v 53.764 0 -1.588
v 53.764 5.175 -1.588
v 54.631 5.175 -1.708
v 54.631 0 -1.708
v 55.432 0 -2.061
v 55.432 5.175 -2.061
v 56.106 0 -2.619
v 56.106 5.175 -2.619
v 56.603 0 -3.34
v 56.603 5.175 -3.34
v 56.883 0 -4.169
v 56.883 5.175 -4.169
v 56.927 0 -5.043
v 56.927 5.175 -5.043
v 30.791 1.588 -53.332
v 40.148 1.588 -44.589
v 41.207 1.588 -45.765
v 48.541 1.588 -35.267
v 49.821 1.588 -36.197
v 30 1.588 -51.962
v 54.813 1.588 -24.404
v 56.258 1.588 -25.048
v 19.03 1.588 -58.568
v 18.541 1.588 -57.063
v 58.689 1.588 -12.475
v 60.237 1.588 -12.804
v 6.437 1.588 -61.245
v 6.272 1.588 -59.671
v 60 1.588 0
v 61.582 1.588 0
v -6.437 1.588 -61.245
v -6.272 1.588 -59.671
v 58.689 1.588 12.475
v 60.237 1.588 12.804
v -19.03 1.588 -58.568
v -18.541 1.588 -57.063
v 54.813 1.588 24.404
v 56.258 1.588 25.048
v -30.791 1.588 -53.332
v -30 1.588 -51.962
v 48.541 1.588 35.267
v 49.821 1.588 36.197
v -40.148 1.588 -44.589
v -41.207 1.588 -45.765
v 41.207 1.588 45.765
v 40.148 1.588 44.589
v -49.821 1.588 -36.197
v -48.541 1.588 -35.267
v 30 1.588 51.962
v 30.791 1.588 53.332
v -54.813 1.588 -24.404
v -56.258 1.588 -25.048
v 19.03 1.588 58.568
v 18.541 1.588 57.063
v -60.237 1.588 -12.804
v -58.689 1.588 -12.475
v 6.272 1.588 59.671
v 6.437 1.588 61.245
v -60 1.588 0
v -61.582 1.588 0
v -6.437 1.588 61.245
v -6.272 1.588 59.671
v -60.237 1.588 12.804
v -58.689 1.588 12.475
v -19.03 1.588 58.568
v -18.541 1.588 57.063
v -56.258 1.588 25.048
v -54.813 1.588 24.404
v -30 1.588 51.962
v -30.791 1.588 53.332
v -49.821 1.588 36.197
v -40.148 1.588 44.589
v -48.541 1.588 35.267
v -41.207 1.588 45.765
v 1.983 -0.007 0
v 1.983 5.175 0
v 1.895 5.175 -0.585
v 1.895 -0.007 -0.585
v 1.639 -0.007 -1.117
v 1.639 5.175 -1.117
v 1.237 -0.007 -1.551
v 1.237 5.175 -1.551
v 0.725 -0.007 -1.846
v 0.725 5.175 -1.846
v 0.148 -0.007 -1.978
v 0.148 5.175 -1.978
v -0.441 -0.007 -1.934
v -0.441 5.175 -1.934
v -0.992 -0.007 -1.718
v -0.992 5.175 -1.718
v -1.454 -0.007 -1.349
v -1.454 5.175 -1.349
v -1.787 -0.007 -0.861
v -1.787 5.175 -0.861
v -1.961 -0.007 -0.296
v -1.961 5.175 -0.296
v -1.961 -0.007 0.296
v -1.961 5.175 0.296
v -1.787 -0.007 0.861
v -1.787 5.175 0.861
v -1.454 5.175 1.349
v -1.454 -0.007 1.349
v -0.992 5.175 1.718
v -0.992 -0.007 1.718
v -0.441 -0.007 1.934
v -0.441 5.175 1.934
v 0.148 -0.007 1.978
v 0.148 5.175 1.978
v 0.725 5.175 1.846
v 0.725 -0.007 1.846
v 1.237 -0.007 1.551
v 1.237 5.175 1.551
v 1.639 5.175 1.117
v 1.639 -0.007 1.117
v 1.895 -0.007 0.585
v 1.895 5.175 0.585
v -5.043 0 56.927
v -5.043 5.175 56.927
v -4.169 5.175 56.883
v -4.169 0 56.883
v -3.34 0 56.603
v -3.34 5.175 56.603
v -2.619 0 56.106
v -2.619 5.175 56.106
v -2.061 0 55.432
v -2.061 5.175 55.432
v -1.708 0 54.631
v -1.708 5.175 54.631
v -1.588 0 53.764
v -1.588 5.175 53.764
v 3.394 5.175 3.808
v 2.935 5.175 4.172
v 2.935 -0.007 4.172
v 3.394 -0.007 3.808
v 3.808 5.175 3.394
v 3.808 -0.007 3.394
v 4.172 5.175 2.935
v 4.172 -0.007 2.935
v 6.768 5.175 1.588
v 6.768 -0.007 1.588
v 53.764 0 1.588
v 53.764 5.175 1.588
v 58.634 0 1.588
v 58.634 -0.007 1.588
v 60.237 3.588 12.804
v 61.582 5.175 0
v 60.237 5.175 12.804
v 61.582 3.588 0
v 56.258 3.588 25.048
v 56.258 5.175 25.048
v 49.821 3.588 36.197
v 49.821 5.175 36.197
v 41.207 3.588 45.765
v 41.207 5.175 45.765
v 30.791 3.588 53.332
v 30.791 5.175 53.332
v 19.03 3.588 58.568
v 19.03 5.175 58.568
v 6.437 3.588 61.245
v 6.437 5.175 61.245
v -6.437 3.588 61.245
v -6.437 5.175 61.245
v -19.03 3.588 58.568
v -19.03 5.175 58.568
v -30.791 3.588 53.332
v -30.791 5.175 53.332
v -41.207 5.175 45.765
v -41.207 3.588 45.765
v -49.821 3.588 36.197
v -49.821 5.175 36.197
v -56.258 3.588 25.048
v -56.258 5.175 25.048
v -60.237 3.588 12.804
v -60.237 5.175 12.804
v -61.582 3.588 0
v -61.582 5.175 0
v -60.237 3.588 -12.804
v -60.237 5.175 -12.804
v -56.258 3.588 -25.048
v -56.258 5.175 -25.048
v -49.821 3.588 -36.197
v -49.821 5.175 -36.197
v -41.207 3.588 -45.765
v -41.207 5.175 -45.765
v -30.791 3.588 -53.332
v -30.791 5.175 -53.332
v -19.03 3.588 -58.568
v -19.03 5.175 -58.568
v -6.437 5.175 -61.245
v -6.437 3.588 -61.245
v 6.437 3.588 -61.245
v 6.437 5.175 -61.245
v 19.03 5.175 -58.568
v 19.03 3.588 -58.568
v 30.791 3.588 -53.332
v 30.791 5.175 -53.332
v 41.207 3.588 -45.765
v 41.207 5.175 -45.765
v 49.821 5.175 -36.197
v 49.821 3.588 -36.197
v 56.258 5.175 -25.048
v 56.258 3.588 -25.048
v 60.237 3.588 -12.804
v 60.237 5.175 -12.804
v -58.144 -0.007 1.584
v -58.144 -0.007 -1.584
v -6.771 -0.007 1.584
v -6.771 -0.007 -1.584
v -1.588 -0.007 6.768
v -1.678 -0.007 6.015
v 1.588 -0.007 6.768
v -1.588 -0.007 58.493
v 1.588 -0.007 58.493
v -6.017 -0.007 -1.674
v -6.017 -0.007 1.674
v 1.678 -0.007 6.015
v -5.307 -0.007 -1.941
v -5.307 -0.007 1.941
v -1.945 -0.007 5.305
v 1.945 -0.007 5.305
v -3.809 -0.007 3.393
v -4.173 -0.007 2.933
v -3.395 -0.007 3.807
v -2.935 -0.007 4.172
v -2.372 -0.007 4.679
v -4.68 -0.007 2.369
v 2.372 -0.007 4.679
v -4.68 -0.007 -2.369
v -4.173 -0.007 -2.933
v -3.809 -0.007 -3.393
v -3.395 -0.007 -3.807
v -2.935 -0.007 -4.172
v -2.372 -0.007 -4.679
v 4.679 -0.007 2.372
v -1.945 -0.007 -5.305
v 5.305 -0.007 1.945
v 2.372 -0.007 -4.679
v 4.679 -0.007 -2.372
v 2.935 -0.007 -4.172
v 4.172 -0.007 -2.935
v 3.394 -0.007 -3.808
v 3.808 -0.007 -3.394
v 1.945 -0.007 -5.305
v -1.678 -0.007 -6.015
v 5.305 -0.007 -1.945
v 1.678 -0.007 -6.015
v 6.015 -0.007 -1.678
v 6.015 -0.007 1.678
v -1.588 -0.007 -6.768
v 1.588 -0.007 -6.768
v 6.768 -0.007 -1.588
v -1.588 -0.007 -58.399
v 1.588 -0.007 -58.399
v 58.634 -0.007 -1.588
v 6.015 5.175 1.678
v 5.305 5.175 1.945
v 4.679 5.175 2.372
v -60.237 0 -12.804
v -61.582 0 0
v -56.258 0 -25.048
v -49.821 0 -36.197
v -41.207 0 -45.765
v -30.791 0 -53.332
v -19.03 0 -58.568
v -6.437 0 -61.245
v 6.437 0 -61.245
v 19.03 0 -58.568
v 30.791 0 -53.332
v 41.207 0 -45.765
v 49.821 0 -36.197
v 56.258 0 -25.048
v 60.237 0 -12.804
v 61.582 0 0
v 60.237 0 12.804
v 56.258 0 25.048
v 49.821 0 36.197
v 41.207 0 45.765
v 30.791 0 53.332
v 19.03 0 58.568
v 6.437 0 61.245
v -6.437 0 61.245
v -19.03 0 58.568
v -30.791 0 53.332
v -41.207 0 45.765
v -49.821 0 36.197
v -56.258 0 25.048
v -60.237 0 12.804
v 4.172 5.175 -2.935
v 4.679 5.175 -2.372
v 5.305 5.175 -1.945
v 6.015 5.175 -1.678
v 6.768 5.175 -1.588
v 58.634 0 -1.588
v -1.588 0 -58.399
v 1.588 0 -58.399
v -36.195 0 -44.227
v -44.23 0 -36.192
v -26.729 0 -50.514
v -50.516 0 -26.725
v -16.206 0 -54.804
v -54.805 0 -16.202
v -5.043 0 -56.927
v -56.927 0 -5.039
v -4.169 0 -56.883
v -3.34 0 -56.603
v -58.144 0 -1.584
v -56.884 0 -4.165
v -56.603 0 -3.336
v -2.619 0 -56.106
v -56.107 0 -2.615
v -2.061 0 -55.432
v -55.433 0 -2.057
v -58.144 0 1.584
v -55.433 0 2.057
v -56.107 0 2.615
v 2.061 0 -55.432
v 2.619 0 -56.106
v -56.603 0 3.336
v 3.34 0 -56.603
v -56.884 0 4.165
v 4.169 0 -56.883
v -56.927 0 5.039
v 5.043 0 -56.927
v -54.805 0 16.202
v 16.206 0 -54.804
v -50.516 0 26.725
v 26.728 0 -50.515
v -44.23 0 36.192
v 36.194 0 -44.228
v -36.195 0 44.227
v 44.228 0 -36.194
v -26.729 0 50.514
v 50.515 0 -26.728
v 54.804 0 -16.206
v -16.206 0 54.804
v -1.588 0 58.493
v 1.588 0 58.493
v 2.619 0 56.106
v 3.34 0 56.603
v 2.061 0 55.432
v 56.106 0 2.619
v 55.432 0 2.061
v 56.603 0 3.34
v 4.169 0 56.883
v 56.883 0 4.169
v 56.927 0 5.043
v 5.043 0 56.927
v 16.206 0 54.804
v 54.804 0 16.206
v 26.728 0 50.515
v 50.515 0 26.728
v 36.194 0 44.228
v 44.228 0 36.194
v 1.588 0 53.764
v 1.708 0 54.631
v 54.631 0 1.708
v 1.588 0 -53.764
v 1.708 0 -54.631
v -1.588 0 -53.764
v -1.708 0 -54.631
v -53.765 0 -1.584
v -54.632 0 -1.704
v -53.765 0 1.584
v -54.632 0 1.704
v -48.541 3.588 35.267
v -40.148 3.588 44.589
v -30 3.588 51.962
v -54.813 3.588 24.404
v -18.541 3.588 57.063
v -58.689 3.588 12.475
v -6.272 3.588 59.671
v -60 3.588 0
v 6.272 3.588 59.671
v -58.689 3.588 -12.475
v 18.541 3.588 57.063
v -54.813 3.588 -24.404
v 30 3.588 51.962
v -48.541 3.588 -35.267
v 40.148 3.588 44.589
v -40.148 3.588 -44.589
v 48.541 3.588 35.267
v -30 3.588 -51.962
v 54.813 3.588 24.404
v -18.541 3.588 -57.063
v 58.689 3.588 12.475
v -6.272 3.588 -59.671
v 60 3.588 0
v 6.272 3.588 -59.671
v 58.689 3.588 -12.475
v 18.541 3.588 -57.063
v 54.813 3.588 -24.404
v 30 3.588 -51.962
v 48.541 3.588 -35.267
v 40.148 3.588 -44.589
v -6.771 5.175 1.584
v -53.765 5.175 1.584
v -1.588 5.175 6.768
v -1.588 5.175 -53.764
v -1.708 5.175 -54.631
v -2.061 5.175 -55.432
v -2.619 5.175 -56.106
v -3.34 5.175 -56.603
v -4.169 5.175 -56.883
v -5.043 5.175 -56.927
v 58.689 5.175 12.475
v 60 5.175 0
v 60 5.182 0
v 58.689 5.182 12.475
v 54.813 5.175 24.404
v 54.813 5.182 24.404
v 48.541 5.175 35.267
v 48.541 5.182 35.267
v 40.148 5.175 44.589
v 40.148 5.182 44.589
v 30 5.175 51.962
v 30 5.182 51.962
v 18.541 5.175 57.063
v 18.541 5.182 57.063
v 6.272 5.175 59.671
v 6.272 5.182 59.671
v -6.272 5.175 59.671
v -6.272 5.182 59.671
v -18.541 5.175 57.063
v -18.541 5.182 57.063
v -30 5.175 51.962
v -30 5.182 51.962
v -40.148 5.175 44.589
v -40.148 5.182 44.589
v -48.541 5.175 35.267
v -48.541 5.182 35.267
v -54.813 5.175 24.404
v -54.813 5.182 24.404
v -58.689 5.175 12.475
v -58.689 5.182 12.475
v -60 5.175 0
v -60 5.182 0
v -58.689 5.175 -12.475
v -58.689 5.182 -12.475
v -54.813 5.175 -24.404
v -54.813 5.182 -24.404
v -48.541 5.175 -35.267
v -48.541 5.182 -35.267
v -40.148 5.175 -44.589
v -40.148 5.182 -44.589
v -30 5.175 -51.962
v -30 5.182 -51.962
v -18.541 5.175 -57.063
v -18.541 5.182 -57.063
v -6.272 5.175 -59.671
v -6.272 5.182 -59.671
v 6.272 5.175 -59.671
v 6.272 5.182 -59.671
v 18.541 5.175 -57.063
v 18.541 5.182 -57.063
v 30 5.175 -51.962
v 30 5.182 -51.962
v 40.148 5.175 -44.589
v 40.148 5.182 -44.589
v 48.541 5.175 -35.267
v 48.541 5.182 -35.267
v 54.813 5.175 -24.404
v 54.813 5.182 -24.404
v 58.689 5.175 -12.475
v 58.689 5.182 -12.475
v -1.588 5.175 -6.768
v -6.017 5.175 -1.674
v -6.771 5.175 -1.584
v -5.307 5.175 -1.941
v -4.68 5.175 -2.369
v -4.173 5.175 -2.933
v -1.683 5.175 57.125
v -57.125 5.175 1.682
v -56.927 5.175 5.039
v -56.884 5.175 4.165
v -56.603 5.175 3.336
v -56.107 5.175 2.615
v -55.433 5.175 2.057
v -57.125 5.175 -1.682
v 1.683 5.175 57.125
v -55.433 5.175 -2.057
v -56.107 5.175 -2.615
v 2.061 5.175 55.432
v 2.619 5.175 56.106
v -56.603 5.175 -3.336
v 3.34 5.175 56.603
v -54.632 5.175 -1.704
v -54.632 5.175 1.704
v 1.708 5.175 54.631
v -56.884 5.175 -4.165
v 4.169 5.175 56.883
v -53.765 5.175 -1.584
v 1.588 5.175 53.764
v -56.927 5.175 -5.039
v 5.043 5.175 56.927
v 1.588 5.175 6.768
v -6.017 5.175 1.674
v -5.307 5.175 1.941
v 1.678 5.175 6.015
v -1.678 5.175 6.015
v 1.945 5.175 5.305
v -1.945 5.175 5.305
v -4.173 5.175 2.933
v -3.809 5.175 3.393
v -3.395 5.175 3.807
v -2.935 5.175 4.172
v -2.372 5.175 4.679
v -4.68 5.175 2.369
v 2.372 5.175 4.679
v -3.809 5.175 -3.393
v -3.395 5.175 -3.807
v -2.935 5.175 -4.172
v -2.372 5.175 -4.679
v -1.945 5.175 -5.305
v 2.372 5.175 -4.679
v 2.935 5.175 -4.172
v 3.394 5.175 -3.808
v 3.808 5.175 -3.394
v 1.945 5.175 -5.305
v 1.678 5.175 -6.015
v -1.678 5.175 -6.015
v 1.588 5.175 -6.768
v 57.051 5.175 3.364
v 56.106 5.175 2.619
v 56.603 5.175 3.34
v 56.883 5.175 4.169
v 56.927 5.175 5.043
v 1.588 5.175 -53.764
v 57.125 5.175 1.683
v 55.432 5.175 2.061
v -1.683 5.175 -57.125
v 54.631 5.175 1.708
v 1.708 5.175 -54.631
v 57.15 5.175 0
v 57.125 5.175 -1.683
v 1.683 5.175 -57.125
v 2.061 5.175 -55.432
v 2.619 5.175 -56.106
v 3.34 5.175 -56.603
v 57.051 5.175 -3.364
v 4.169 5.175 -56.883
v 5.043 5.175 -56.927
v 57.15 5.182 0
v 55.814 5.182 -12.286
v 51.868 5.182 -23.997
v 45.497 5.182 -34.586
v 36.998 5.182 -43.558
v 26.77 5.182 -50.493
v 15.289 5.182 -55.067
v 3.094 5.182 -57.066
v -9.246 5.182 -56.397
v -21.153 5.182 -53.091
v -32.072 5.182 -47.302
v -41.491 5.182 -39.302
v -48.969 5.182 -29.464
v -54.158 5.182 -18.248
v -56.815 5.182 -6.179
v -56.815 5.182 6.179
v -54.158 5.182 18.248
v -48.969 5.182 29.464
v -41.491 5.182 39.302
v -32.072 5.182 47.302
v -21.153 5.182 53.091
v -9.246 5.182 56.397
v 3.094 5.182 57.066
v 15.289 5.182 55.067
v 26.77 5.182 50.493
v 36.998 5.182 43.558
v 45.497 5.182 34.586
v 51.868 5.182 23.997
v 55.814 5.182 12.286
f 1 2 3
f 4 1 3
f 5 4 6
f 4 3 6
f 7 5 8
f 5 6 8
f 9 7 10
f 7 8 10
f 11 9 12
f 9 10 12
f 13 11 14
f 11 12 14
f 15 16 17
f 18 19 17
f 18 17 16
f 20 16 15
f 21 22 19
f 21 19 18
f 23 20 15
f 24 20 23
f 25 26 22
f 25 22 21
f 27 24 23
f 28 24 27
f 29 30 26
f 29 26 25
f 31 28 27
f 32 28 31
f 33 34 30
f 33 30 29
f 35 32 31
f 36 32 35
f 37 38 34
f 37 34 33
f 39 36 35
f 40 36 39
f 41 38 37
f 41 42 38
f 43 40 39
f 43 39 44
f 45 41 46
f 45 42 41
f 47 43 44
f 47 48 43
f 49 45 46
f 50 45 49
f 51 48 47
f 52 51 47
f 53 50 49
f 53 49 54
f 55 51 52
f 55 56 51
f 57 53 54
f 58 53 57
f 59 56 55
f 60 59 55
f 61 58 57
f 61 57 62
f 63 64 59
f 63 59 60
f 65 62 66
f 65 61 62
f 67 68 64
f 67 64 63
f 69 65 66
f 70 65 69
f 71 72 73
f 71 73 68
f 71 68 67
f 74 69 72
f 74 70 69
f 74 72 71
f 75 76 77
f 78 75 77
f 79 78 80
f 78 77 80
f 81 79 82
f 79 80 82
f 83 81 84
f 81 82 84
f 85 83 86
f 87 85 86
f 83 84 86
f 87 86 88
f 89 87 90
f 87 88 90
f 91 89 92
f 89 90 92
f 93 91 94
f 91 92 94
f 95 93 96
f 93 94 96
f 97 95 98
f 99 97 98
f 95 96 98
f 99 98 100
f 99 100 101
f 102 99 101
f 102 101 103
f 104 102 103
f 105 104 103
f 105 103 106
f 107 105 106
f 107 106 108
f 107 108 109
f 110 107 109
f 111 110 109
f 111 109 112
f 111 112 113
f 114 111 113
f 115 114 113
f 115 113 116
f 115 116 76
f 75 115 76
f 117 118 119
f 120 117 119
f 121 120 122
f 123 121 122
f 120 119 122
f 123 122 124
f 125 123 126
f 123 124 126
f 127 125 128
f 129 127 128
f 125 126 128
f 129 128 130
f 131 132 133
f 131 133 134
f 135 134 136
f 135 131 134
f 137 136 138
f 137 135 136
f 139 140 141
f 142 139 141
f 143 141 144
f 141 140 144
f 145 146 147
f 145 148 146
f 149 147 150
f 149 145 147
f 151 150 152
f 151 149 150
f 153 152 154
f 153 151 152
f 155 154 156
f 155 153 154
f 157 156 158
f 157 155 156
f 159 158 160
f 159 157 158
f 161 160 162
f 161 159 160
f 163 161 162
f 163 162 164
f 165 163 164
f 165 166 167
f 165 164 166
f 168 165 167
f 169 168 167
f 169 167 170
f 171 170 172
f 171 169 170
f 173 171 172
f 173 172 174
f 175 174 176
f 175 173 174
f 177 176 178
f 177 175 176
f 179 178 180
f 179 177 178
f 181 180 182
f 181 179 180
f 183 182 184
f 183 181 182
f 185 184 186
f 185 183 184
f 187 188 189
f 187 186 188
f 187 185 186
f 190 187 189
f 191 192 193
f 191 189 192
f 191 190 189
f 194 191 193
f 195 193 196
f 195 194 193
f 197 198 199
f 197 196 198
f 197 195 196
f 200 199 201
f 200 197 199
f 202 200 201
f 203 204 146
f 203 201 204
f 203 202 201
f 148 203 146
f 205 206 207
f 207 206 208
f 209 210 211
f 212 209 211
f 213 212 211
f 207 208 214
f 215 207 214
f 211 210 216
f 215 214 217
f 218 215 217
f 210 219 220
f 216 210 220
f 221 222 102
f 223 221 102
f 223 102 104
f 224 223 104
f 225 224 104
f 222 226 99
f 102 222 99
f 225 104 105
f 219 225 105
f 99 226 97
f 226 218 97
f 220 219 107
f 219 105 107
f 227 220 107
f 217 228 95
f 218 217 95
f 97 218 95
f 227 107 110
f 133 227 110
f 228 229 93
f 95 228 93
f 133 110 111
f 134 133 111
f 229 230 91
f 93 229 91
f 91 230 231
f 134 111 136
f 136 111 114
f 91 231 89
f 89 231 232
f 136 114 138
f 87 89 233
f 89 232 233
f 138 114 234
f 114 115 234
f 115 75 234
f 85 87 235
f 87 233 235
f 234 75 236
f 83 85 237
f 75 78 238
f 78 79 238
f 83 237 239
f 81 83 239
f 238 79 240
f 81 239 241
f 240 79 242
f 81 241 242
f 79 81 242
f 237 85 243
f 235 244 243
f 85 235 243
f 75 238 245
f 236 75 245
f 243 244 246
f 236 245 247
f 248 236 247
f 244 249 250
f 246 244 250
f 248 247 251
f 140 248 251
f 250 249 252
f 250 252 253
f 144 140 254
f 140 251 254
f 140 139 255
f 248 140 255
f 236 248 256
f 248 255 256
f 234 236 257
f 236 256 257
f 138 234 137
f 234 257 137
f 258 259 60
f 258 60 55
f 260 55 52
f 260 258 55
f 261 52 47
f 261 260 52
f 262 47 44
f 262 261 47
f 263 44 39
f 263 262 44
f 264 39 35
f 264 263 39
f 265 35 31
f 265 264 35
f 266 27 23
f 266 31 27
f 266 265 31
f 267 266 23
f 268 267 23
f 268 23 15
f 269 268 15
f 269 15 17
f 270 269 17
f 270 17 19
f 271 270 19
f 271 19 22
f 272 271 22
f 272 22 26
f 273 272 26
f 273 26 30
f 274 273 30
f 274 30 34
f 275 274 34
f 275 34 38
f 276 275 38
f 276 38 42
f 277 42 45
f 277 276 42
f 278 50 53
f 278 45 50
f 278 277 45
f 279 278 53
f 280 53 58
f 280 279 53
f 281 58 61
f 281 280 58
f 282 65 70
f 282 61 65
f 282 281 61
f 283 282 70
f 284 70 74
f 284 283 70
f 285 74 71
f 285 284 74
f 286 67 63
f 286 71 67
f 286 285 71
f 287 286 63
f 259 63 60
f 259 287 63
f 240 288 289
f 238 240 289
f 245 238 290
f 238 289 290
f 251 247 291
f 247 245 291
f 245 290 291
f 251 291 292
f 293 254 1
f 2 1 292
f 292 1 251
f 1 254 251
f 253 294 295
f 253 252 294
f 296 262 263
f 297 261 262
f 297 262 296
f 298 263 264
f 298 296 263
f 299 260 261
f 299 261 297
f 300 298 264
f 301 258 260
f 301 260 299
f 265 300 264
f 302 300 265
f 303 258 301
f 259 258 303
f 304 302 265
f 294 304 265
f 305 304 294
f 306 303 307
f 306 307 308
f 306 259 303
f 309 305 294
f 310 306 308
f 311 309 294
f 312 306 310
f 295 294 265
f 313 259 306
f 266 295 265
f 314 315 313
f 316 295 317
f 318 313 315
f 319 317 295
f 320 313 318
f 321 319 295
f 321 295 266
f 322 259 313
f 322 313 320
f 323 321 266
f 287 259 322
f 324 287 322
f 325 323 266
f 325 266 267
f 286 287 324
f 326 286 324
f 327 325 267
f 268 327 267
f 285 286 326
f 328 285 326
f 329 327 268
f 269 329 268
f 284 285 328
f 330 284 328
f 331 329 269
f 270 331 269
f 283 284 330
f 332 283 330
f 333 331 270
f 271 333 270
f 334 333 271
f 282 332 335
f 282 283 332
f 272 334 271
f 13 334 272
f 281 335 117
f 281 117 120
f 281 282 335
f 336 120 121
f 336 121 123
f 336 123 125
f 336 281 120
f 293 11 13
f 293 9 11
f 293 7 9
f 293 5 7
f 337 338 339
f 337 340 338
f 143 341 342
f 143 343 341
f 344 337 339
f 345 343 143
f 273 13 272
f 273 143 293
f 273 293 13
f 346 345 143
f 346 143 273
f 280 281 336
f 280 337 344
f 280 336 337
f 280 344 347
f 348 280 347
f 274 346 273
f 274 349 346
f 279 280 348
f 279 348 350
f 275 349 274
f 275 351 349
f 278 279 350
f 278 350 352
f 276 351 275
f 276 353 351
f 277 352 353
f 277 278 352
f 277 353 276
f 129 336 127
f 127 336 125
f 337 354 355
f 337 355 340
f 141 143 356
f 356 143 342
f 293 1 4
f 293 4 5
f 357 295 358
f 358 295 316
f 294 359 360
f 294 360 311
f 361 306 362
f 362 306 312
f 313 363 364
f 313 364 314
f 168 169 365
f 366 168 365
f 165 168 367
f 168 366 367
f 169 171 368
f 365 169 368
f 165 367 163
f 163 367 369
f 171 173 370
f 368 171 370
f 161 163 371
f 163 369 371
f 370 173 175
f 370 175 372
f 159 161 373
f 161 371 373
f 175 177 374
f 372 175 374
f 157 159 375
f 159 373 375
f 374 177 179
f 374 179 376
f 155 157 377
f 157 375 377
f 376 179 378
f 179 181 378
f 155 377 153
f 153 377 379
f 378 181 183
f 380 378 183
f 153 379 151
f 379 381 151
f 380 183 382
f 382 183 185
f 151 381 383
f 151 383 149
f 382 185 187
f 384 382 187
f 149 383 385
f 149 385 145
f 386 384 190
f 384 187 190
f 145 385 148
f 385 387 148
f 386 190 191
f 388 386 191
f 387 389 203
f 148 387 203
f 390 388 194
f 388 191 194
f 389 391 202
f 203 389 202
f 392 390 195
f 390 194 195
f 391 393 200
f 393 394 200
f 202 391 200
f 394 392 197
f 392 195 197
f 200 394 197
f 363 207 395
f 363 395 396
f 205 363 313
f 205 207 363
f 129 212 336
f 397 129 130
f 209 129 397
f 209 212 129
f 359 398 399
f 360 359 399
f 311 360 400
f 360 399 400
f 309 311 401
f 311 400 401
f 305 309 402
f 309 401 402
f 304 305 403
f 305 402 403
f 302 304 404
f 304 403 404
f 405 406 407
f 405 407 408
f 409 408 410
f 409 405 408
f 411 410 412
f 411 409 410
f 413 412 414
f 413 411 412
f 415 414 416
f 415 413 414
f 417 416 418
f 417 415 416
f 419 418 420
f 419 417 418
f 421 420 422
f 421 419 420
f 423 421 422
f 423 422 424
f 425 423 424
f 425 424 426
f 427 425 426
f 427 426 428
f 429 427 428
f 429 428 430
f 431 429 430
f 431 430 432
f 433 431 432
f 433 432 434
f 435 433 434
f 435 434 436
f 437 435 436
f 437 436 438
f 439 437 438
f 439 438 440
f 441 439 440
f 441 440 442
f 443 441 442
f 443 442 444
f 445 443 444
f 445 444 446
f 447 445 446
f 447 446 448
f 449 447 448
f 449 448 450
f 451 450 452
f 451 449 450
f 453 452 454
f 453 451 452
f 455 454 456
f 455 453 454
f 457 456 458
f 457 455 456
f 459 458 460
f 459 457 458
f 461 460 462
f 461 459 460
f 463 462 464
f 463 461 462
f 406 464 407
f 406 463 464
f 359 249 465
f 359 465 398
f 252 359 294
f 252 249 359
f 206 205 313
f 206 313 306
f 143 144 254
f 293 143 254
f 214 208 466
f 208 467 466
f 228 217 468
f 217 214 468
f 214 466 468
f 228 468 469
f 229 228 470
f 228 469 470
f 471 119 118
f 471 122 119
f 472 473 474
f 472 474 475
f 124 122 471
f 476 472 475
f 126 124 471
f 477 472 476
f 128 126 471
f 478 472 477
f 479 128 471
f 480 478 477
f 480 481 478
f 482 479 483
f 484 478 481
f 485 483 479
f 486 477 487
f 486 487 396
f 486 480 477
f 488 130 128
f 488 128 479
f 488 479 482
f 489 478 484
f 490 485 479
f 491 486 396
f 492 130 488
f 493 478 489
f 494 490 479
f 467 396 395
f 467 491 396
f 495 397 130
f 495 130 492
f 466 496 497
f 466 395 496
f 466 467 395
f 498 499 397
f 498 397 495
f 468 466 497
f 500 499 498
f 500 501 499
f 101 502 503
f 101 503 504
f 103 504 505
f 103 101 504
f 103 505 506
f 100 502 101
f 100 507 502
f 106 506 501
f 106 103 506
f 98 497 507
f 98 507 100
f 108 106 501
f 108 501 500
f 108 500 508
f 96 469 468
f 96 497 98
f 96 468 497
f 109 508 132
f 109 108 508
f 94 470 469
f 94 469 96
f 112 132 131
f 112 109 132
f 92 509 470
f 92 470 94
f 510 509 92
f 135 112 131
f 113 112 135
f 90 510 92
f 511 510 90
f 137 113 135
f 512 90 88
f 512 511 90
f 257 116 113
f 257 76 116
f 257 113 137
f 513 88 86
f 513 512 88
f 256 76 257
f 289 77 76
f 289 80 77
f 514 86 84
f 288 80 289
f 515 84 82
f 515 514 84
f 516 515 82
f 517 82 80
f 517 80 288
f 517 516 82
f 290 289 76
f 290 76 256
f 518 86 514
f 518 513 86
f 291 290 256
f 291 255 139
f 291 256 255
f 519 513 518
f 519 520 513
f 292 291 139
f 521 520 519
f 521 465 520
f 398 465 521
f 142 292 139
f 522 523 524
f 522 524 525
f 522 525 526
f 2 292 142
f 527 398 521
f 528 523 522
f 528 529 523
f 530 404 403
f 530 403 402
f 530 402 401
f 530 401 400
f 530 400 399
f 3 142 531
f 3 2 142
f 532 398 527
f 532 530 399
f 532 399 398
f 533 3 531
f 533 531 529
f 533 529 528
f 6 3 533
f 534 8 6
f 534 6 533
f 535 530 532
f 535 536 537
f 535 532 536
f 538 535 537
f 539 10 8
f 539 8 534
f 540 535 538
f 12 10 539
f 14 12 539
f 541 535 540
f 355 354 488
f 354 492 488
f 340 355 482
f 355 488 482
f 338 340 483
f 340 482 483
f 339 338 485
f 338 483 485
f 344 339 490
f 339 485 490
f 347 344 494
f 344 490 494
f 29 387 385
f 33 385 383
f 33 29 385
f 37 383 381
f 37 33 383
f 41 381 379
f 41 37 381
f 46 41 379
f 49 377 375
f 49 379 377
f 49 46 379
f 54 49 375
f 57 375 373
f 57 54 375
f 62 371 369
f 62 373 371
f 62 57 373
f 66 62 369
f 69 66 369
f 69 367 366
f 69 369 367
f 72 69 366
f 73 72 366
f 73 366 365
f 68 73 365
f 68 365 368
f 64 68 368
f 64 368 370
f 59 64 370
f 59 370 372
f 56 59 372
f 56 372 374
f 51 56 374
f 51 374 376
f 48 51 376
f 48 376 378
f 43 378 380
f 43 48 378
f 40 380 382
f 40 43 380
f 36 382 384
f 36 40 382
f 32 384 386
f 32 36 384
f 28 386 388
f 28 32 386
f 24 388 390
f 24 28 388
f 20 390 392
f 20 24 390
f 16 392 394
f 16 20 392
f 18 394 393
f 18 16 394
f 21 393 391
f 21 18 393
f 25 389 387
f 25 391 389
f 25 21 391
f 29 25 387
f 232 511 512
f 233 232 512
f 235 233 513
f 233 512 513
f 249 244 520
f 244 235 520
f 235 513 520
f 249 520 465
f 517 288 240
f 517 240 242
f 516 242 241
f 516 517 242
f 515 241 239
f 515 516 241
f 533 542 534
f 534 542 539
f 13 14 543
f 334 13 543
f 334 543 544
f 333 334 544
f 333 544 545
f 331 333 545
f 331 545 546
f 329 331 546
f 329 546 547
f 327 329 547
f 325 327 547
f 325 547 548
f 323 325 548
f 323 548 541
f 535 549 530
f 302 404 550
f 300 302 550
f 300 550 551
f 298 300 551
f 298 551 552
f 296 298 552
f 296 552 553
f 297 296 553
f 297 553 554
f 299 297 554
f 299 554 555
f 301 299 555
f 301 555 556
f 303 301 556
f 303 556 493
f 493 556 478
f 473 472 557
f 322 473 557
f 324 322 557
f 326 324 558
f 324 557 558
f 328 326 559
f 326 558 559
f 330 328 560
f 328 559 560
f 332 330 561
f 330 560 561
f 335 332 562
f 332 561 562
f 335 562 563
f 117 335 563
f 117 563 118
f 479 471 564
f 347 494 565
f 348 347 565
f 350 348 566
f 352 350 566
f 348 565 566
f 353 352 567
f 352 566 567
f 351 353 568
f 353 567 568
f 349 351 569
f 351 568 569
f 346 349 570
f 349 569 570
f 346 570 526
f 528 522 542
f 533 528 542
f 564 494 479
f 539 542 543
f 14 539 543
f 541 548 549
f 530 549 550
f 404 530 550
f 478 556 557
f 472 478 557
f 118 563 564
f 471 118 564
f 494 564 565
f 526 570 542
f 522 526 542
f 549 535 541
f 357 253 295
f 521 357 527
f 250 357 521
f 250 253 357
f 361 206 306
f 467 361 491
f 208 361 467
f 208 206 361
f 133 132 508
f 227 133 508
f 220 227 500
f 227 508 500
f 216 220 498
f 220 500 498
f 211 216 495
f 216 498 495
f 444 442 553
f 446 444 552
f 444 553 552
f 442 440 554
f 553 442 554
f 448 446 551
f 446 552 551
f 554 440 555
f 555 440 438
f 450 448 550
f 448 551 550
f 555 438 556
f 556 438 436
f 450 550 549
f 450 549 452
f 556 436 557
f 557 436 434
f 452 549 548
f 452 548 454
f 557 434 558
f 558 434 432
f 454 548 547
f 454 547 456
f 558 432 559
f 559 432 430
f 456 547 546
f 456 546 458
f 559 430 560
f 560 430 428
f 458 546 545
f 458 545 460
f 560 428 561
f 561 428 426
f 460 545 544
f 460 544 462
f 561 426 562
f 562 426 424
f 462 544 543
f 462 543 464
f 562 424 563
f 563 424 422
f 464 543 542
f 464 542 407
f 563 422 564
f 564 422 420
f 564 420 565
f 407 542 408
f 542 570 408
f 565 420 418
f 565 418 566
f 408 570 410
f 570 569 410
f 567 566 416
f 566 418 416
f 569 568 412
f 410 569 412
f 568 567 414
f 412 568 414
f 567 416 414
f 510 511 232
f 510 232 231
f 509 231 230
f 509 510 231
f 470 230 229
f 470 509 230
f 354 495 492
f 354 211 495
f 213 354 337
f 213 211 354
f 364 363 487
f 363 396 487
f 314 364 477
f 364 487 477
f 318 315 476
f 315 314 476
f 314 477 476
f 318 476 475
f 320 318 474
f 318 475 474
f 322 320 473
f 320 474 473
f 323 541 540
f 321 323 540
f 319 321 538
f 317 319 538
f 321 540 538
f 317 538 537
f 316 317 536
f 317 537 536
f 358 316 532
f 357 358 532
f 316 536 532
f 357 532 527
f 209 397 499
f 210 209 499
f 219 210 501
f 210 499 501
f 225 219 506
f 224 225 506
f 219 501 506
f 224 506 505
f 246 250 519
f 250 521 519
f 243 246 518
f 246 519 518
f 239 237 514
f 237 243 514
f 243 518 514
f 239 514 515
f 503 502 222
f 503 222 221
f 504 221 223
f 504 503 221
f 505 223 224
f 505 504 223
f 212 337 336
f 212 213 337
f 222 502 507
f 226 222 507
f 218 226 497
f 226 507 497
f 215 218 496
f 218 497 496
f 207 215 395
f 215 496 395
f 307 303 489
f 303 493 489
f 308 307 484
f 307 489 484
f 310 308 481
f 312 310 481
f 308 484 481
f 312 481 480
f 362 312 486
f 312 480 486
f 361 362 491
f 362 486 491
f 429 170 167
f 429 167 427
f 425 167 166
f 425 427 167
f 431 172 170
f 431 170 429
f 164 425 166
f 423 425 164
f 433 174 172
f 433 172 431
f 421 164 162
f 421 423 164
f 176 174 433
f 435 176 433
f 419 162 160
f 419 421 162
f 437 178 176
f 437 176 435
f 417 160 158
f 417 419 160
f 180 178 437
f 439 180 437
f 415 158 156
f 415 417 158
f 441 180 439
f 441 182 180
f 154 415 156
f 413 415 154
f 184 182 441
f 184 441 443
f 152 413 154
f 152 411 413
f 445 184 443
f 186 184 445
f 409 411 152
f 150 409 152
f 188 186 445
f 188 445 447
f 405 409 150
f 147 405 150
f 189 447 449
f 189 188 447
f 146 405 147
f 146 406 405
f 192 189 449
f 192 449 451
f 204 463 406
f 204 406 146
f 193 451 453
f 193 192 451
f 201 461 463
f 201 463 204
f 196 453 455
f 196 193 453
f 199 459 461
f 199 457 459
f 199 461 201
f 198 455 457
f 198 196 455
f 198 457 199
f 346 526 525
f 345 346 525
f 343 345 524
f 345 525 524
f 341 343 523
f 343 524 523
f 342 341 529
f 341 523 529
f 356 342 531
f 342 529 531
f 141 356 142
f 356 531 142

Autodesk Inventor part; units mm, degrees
ref_plane "YZ Plane" through (0, 0, 0) normal (1, 0, 0) x (0, 1, 0)
ref_plane "XZ Plane" through (0, 0, 0) normal (0, 1, 0) x (-1, 0, 0)
ref_plane "XY Plane" through (0, 0, 0) normal (0, 0, 1) x (1, 0, 0)
sketch "Sketch1" plane through (0, 0, 0) normal (0, 1, 0) x (-1, 0, 0)
  circle A0 centre (0, 0) radius 60
  circle A1 centre (0, 0) radius 61.5823
  dimension "d0" = 120
  dimension "d1" = 123.1646
extrude "Extrusion1" add sketch "Sketch1" along normal blind 1.5875
sketch "Sketch2" plane through (0, 1.5875, 0) normal (0, 1, 0) x (1, 0, 0)
  circle A0 centre (0, 0) radius 60
  circle A1 centre (0, 0) radius 57.15
  dimension "d4" = 114.3
extrude "Extrusion2" add sketch "Sketch2" along normal blind 2
sketch "Sketch3" plane through (0, 3.5875, 0) normal (0, 1, 0) x (1, 0, 0)
  circle A0 centre (0, 0) radius 60
  circle A1 centre (0, 0) radius 61.5823
extrude "Extrusion3" add sketch "Sketch3" along normal blind 1.5875
sketch "Sketch4" plane through (0, 0, 0) normal (0, -1, 0) x (1, 0, 0)
  circle A0 centre (0, 0) radius 60
extrude "Extrusion4" add sketch "Sketch4" against normal blind 5.1816
sketch "Sketch5" plane through (0, 5.1816, 0) normal (0, 1, 0) x (1, 0, 0)
  circle A0 centre (0, 0) radius 57.15
  dimension "d11" = 114.3
extrude "Extrusion5" cut sketch "Sketch5" against normal blind 5.1816
sketch "Sketch6" plane through (0, 5.175, 0) normal (0, 1, 0) x (1, 0, 0)
  circle A0 centre (0, 0) radius 2.4765
  circle A1 centre (0, 0) radius 5.1008
  dimension "d14" = 4.953
extrude "Extrusion6" add sketch "Sketch6" against normal blind 5.1816
sketch "Sketch7" plane through (0, -0.0066, 0) normal (0, -1, 0) x (1, 0, 0)
  circle A0 centre (0, 0) radius 5.1008 projected
  circle A1 centre (0, 0) radius 57.15 projected
  line L0 (-3.0273, 1.5838) -> (-58.1435, 1.5838)
  line L1 (-58.1435, 1.5838) -> (-58.1435, -1.5838)
  line L2 (-58.1435, -1.5838) -> (-3.0273, -1.5838)
  line L3 (-3.0273, -1.5838) -> (-3.0273, 1.5838)
  line L4 (-3.0273, 1.5838) -> (-58.1435, -1.5838) construction
  line L5 (-58.1435, 1.5838) -> (-3.0273, -1.5838) construction
  line L6 (1.5875, 58.4929) -> (-1.5875, 58.4929)
  line L7 (-1.5875, 58.4929) -> (-1.5875, 3.6522)
  line L8 (-1.5875, 3.6522) -> (1.5875, 3.6522)
  line L9 (1.5875, 3.6522) -> (1.5875, 58.4929)
  line L10 (1.5875, 58.4929) -> (-1.5875, 3.6522) construction
  line L11 (-1.5875, 58.4929) -> (1.5875, 3.6522) construction
  line L12 (58.6337, -1.5875) -> (3.4947, -1.5875)
  line L13 (3.4947, -1.5875) -> (3.4947, 1.5875)
  line L14 (3.4947, 1.5875) -> (58.6337, 1.5875)
  line L15 (58.6337, 1.5875) -> (58.6337, -1.5875)
  line L16 (58.6337, -1.5875) -> (3.4947, 1.5875) construction
  line L17 (3.4947, -1.5875) -> (58.6337, 1.5875) construction
  line L18 (1.5875, -3.7293) -> (-1.5875, -3.7293)
  line L19 (-1.5875, -3.7293) -> (-1.5875, -58.3991)
  line L20 (-1.5875, -58.3991) -> (1.5875, -58.3991)
  line L21 (1.5875, -58.3991) -> (1.5875, -3.7293)
  line L22 (1.5875, -3.7293) -> (-1.5875, -58.3991) construction
  line L23 (-1.5875, -3.7293) -> (1.5875, -58.3991) construction
  point P0 (-30.5854, 0)
  point P1 (0, 31.0726)
  point P2 (31.0642, 0)
  point P3 (0, -31.0642)
  dimension "d17" = 3.175
  dimension "d18" = 3.175
extrude "Extrusion7" add sketch "Sketch7" against normal blind 5.1816 contours A0 L12 L13 L14 | A0 L14 A1 L12 | L9 L8 L7 A0 | A0 L7 A1 L9 | L14 L15 L12 A1 | L21 A1 L19 A0 | A0 L19 L18 L21 | A1 L7 L6 L9 | L21 L20 L19 A1 | L0 L3 L2 A0 | A0 L2 A1 L0 | A1 L2 L1 L0
fillet "Fillet1" radius 3.175 8 edges at (57.1279, 2.5875, 1.5875) (57.1279, 2.5875, -1.5875) (-1.5875, 2.5875, 57.1279) (1.5875, 2.5875, 57.1279) (-57.128, 2.5875, 1.5838) (-57.128, 2.5875, -1.5838) (-1.5875, 2.5875, -57.1279) (1.5875, 2.5875, -57.1279)
fillet "Fillet2" radius 3.175 8 edges at (4.8475, 2.5842, -1.5875) (1.5875, 2.5842, -4.8475) (-1.5875, 2.5842, 4.8475) (-4.8487, 2.5842, 1.5838) (-1.5875, 2.5842, -4.8475) (-4.8487, 2.5842, -1.5838) (4.8475, 2.5842, 1.5875) (1.5875, 2.5842, 4.8475)
sketch "Sketch8" plane through (0, 5.175, 0) normal (0, 1, 0) x (1, 0, 0)
  circle A0 centre (0, 0) radius 1.9833
  circle A1 centre (0, 0) radius 2.4765
extrude "Extrusion8" add sketch "Sketch8" against normal blind 5.1816
properties part number "MTV Front Brake Axle (11.19)"
